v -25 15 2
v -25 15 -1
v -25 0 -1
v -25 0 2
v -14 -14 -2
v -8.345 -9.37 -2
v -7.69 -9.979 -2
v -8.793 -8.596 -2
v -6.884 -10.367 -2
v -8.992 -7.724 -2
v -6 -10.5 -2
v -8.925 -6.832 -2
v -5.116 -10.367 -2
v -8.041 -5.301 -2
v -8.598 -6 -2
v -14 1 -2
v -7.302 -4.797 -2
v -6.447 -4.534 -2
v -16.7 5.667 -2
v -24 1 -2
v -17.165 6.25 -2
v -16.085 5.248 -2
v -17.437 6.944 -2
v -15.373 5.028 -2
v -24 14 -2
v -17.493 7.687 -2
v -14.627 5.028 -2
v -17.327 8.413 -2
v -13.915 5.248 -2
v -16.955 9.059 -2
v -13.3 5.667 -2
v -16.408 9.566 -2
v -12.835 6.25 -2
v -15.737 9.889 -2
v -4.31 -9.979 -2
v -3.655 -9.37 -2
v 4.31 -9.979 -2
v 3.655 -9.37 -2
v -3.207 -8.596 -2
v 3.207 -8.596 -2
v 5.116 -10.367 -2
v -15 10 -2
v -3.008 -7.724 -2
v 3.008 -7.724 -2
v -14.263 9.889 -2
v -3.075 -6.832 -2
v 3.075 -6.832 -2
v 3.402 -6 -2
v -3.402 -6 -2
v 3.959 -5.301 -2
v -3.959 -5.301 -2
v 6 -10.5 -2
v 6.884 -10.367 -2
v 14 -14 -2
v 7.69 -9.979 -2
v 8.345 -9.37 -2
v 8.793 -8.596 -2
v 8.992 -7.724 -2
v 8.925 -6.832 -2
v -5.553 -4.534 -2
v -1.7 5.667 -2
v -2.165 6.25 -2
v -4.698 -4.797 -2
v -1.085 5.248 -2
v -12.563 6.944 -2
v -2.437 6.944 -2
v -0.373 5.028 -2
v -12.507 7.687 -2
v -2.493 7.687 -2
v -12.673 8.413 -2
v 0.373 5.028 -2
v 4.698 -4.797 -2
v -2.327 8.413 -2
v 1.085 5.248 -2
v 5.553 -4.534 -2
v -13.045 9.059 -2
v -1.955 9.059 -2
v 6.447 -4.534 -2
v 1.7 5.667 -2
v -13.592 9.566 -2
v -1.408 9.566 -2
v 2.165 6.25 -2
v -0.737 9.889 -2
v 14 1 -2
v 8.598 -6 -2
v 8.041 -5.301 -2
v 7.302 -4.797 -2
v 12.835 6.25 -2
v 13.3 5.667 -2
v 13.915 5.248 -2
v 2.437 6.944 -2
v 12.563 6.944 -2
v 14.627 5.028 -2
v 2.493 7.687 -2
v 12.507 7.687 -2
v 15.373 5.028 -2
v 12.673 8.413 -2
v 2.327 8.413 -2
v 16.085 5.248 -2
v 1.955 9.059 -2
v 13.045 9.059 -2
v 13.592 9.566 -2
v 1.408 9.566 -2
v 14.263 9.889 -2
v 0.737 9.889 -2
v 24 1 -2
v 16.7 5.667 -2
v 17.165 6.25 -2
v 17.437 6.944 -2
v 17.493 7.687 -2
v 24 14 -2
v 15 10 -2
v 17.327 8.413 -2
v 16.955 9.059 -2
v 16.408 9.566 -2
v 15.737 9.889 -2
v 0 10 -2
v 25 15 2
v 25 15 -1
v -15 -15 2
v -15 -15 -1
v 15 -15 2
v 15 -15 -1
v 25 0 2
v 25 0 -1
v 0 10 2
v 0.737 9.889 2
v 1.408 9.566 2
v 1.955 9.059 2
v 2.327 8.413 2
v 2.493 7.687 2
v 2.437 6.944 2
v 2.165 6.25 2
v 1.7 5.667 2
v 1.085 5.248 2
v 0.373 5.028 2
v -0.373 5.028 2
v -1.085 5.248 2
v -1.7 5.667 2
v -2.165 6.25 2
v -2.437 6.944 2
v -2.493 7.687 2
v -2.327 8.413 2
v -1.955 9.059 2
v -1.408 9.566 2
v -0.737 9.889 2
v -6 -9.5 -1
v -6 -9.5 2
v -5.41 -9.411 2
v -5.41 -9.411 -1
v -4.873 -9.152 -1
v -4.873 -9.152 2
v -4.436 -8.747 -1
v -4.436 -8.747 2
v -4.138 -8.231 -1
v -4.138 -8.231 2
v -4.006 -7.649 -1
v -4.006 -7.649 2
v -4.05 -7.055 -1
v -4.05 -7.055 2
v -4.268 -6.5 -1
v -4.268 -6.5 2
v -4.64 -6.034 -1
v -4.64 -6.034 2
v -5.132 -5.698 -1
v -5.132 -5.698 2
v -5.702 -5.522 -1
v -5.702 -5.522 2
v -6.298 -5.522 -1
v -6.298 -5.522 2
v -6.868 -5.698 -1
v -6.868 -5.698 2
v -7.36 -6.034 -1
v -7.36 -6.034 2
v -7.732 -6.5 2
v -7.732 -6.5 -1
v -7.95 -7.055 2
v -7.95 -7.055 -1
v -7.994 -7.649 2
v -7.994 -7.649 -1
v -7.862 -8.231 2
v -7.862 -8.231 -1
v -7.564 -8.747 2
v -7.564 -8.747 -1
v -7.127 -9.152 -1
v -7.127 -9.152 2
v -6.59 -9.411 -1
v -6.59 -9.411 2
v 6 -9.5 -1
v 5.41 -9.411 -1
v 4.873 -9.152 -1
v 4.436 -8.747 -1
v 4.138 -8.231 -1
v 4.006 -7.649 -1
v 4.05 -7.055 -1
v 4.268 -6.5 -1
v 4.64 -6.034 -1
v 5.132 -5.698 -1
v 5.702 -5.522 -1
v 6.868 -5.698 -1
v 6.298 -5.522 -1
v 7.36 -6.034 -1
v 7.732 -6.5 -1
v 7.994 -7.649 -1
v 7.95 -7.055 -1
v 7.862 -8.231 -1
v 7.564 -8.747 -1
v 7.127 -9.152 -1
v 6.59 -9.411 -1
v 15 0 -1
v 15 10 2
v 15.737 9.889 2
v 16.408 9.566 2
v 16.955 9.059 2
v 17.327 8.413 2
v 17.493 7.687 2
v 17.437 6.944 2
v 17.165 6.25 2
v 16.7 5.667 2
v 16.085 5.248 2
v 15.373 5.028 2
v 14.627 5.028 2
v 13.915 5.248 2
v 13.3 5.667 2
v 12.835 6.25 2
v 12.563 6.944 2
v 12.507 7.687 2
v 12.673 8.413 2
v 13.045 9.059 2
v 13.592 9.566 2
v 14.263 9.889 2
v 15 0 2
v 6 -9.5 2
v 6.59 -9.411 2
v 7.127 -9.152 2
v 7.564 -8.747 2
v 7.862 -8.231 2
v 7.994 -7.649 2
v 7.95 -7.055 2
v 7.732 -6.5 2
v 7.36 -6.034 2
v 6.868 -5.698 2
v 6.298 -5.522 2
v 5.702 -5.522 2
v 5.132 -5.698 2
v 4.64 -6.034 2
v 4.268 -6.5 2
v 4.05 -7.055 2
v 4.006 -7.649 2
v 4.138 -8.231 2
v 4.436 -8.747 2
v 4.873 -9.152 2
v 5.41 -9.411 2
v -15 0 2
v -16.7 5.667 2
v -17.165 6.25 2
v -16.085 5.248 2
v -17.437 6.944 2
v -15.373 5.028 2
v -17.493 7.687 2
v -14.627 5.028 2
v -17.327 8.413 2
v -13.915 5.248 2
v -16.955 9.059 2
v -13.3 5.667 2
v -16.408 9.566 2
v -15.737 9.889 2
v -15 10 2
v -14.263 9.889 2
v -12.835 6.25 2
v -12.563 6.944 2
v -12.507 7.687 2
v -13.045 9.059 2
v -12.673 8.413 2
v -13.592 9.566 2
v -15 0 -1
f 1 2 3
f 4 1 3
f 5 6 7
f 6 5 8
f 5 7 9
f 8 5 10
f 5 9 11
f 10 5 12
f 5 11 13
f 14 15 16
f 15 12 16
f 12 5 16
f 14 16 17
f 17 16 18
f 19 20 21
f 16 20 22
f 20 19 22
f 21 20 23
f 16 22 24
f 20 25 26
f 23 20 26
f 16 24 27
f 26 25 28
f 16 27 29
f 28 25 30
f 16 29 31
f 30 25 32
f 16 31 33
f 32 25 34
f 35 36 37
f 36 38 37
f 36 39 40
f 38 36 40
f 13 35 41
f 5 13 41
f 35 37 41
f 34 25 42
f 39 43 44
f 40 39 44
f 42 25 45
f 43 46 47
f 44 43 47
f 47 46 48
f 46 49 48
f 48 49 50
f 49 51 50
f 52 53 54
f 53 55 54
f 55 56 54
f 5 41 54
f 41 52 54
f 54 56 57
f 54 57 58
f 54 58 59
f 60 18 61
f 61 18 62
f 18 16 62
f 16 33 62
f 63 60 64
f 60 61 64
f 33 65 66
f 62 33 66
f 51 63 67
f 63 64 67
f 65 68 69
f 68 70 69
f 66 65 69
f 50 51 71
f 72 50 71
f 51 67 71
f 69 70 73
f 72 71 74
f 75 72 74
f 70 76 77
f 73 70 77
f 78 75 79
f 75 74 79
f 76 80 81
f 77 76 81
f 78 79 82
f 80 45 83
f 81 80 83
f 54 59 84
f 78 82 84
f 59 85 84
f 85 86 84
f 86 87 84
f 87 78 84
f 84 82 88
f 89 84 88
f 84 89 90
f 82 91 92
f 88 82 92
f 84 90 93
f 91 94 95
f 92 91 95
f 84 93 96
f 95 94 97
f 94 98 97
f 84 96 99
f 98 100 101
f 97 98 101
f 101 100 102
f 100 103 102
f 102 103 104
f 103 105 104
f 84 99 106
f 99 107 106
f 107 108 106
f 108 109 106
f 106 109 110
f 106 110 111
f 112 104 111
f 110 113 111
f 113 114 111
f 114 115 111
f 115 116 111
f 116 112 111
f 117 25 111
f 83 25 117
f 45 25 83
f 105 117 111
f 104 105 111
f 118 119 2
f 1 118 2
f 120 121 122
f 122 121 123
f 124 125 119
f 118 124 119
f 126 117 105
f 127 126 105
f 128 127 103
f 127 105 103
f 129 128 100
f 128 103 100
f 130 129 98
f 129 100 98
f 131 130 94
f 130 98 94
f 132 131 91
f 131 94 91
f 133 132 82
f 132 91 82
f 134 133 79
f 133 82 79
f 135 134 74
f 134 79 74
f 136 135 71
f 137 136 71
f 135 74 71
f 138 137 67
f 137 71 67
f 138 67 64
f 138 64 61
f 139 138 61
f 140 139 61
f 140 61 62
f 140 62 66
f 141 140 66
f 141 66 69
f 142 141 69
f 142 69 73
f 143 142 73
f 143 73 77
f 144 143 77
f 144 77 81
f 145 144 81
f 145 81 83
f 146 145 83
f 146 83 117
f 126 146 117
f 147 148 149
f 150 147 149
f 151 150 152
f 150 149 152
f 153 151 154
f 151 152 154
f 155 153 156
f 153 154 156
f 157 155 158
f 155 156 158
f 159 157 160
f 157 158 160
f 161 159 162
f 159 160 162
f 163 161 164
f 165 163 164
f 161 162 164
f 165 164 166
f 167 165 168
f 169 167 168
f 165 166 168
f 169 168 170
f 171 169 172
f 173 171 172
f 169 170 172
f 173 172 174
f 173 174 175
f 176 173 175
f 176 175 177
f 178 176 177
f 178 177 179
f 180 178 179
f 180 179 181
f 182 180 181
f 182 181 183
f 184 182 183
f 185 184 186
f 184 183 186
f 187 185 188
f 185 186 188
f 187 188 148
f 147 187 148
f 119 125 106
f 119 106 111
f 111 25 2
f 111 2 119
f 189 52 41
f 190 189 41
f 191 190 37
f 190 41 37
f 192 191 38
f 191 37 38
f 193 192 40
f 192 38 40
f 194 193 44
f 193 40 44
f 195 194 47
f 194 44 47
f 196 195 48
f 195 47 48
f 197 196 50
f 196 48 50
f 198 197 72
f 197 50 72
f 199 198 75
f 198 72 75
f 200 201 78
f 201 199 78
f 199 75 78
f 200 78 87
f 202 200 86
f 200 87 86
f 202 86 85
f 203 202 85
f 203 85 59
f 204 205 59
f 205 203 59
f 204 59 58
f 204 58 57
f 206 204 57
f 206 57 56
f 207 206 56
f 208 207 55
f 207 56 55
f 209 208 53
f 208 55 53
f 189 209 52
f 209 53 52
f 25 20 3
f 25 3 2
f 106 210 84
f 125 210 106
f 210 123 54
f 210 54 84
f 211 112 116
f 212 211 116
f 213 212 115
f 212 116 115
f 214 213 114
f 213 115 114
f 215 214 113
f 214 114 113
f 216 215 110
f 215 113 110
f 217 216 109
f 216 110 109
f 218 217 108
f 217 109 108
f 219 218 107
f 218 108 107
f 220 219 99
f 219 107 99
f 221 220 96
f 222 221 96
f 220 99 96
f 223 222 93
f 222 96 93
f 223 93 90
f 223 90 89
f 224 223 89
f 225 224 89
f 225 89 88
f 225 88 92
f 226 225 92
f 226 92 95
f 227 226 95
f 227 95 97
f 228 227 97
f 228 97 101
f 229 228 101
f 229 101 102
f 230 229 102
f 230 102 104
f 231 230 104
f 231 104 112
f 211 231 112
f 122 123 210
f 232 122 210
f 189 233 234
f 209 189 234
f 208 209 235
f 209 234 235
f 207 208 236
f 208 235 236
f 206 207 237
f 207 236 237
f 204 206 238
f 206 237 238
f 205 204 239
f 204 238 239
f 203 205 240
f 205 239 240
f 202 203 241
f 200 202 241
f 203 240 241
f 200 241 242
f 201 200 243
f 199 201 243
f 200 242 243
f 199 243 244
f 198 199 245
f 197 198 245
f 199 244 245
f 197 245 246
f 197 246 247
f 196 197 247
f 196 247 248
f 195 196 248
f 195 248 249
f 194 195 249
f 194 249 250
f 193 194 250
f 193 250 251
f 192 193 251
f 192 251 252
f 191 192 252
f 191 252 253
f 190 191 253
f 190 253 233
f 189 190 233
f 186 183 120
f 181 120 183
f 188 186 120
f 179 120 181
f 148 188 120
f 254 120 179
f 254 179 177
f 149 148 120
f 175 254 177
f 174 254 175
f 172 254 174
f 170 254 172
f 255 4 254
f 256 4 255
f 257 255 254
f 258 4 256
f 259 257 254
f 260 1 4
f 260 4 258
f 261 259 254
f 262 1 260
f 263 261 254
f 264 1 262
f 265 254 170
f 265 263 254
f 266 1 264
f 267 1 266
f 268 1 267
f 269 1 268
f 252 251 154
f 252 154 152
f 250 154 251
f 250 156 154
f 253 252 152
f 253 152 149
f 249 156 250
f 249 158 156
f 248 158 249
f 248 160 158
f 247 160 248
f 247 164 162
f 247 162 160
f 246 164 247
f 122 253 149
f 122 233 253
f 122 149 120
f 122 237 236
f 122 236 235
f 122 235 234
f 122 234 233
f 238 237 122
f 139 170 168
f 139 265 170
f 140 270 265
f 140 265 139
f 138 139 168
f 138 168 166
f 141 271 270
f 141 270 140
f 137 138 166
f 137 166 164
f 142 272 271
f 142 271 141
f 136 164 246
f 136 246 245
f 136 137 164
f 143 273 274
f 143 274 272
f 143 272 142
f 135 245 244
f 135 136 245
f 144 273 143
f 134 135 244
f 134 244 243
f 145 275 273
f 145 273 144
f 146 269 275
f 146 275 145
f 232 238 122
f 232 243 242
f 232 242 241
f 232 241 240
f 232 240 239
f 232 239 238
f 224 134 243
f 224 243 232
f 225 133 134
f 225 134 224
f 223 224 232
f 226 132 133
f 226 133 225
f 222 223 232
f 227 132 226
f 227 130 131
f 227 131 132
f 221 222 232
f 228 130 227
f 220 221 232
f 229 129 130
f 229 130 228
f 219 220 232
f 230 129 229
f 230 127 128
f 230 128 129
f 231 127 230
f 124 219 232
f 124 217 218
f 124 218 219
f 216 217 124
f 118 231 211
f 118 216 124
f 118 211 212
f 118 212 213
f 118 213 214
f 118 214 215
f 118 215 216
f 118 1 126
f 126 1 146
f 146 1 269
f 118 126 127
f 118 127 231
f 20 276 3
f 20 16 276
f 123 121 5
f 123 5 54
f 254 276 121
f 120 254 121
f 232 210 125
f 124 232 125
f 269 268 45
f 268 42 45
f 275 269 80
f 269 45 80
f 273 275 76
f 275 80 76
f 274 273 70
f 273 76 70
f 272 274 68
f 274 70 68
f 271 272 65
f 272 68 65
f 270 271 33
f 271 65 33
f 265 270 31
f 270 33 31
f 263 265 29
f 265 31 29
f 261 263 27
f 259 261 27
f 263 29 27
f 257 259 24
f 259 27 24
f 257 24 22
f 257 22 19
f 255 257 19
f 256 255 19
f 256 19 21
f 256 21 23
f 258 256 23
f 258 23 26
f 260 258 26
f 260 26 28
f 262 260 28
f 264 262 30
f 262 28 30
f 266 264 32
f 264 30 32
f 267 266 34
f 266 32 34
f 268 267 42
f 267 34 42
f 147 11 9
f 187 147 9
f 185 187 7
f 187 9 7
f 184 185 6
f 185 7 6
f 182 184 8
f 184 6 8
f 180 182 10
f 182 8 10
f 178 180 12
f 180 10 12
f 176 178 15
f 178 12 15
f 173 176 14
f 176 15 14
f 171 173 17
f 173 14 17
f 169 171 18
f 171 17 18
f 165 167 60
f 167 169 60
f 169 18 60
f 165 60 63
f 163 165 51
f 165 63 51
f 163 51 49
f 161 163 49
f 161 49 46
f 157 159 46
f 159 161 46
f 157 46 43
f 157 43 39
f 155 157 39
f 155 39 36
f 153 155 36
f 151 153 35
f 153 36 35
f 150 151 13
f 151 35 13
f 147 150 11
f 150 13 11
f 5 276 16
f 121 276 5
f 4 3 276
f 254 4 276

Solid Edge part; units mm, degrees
sketch "Sketch1" plane through (0, 0, 0) normal (0, 0, 1) x (1, 0, 0)
  line L0 (-25, 15) -> (-25, 0)
  line L1 (-25, 0) -> (-15, 0)
  line L2 (-15, 0) -> (-15, -15)
  line L3 (-15, -15) -> (15, -15)
  line L4 (15, -15) -> (15, 0)
  line L5 (15, 0) -> (25, 0)
  line L6 (25, 0) -> (25, 15)
  line L7 (25, 15) -> (-25, 15)
  dimension "D1" = 50
  dimension "D2" = 30
  dimension "D3" = 30
  dimension "D4" = 15
extrude "Protrusion1" add sketch "Sketch1" along normal mid plane 4
hole "Hole_1" at (-6, -7.5, 2) direction (0, 0, -1) diameter 4 end up to next
hole "Hole1" at (6, -7.5, 2) direction (0, 0, -1) diameter 4 end up to next
chamfer "Chamfer_1" distance 1 angle 45 10 edges at (-25, 7.5, -2) (-20, 0, -2) (-15, -7.5, -2) (0, -15, -2) (15, -7.5, -2) (20, 0, -2) (25, 7.5, -2) (0, 15, -2) (-8, -7.5, -2) (4, -7.5, -2)
hole "Hole_3" at (-15, 7.5, -2) direction (0, 0, 1) diameter 5 end up to next
hole "Hole2" at (15, 7.5, -2) direction (0, 0, 1) diameter 5 end up to next
hole "Hole3" at (0, 7.5, -2) direction (0, 0, 1) diameter 5 end up to next
